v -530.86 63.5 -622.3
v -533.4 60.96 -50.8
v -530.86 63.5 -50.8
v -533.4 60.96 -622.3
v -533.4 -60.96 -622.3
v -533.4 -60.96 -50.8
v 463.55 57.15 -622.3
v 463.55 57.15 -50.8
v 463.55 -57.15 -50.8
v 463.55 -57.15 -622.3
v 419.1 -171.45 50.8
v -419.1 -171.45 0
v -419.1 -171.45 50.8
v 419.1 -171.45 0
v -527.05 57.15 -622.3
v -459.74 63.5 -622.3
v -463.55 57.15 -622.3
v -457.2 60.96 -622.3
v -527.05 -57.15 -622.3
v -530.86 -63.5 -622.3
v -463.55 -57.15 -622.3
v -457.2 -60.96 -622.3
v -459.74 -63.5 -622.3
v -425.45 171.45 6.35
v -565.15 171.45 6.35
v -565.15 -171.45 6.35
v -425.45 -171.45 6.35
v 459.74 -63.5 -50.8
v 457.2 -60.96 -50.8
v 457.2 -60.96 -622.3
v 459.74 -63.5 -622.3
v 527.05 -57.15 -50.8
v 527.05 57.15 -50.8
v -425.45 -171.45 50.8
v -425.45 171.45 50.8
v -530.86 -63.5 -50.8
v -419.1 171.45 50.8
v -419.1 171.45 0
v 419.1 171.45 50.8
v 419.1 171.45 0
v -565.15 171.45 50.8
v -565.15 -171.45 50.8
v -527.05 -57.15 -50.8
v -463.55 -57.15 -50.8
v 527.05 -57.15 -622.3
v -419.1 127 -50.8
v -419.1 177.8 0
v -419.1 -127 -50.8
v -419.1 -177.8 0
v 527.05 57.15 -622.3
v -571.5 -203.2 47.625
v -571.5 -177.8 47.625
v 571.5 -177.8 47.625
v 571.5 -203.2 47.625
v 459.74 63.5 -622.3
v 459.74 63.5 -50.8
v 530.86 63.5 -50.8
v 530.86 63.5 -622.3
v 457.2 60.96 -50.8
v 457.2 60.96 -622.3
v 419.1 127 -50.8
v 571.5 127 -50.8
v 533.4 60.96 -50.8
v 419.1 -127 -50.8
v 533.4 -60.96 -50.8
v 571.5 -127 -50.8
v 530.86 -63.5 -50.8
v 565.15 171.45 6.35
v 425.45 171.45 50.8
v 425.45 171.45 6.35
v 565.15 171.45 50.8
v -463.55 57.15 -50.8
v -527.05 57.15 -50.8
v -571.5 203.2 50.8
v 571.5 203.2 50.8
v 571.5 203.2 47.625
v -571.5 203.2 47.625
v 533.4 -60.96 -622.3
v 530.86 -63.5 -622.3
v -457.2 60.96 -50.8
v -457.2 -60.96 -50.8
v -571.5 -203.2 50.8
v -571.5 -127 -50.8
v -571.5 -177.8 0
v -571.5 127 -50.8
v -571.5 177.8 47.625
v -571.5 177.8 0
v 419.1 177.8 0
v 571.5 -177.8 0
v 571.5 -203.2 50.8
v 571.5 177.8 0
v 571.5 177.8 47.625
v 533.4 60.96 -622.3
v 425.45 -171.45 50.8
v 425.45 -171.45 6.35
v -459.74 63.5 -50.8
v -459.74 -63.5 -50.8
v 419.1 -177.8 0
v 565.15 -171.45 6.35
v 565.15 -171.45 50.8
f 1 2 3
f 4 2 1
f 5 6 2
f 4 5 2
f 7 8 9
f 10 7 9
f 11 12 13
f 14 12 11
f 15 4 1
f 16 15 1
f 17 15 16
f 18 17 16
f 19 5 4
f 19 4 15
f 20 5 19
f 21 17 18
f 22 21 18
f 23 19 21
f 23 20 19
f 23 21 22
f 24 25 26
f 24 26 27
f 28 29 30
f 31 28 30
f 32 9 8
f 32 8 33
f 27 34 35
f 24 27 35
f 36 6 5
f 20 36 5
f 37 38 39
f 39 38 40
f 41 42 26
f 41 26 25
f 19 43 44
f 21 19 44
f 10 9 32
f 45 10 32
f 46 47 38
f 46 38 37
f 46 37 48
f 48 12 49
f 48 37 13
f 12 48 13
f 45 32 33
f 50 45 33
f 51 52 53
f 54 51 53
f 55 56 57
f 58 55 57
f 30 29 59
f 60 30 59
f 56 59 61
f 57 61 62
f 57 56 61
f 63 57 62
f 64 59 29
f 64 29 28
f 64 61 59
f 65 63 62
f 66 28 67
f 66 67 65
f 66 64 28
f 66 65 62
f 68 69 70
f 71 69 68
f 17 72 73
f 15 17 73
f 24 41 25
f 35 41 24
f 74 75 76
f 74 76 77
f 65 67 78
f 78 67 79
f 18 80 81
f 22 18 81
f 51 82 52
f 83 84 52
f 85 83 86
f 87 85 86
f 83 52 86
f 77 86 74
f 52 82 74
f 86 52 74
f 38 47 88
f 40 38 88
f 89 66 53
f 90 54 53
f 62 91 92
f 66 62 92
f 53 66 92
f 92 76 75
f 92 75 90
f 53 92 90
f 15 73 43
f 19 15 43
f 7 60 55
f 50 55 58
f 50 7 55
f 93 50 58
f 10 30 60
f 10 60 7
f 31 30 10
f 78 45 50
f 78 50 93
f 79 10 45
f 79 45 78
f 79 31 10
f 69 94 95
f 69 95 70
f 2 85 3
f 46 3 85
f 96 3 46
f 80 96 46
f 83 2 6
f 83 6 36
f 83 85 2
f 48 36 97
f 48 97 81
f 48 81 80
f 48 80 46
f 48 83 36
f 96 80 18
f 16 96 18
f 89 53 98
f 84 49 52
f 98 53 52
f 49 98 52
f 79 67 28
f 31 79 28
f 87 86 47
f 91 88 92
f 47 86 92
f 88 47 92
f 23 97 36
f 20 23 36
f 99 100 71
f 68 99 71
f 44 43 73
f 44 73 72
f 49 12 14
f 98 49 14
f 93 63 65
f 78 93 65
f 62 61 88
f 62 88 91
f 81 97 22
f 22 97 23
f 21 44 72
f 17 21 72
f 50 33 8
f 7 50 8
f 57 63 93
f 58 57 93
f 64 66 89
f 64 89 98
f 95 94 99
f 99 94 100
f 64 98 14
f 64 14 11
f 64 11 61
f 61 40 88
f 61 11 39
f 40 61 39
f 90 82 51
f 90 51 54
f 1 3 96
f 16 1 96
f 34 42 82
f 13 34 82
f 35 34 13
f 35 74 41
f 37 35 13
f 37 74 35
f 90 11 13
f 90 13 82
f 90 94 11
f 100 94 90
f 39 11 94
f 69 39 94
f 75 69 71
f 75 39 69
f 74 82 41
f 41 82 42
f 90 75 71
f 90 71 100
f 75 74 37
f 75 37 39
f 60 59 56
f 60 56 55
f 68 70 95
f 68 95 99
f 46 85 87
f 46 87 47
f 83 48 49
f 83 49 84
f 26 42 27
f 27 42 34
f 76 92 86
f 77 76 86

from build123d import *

# Parameters (mm, degrees)
F0_W      = 1143
F0_H      = 355.6
F0_W_2    = 838.2
F0_H_2    = 342.9
F1_DEPTH  = 50.8
F2_W      = 139.7
F2_H      = 342.9
F3_DEPTH  = 44.45
F4_W      = 1143
F4_H      = 3.175
F5_DEPTH  = 25.4
F6_W      = 1143
F6_H      = 3.175
F7_DEPTH  = 25.4
F9_DEPTH  = 50.8
F10_SIZE  = 50.8
F13_DEPTH = 571.5
F14_SIZE  = 2.54


with BuildPart() as f1:
    # F0 (on Top) → F1 (new body)
    with BuildSketch(Plane.XY):
        Rectangle(F0_W, F0_H)
        Rectangle(F0_W_2, F0_H_2, mode=Mode.SUBTRACT)
    extrude(amount=F1_DEPTH)

    # F2 (on face) → F3 (cut)
    with BuildSketch(Plane.XY.offset(50.8)):
        with Locations((-495.3, 0)):
            Rectangle(F2_W, F2_H)
        with Locations((495.3, 0)):
            Rectangle(F2_W, F2_H)
    extrude(amount=-F3_DEPTH, mode=Mode.SUBTRACT)

    # F4 (on face) → F5 (join)
    with BuildSketch(Plane(origin=(0, 177.8, 0), x_dir=(-1, 0, 0), z_dir=(0, 1, 0))):
        with Locations((0, 49.2125)):
            Rectangle(F4_W, F4_H)
    extrude(amount=F5_DEPTH)

    # F6 (on face) → F7 (join)
    with BuildSketch(Plane.XZ.offset(177.8)):
        with Locations((0, 49.2125)):
            Rectangle(F6_W, F6_H)
    extrude(amount=F7_DEPTH)

    # F8 (on face) → F9 (join)
    with BuildSketch(Plane(origin=(0, 0, 0), x_dir=(1, 0, 0), z_dir=(0, 0, -1))):
        Polygon((-419.1, 177.8), (-571.5, 177.8), (-571.5, -177.8), (-419.1, -177.8), (-419.1, -171.45), (-419.1, 171.45), align=None)
        Polygon((571.5, 177.8), (419.1, 177.8), (419.1, 171.45), (419.1, -171.45), (419.1, -177.8), (571.5, -177.8), align=None)
    extrude(amount=F9_DEPTH)

    # F10
    f10_edges = [f1.edges().sort_by_distance(p)[0] for p in [
        (-495.3, 177.8, -50.8),
        (-495.3, -177.8, -50.8),
        (495.3, -177.8, -50.8),
        (495.3, 177.8, -50.8),
    ]]
    chamfer(f10_edges, length=F10_SIZE)

    # F11 (on face) + F12 (on face) → F13 (join)
    with BuildSketch(Plane(origin=(0, 0, -50.8), x_dir=(1, 0, 0), z_dir=(0, 0, -1))):
        Polygon((457.2, -63.5), (495.3, -63.5), (533.4, -63.5), (533.4, 63.5), (457.2, 63.5), align=None)
        Polygon((527.05, -57.15), (495.3, -57.15), (463.55, -57.15), (463.55, 57.15), (527.05, 57.15), align=None, mode=Mode.SUBTRACT)
    with BuildSketch(Plane(origin=(0, 0, -50.8), x_dir=(1, 0, 0), z_dir=(0, 0, -1))):
        Polygon((-533.4, -63.5), (-495.3, -63.5), (-457.2, -63.5), (-457.2, 63.5), (-533.4, 63.5), align=None)
        Polygon((-463.55, -57.15), (-495.3, -57.15), (-527.05, -57.15), (-527.05, 57.15), (-463.55, 57.15), align=None, mode=Mode.SUBTRACT)
    extrude(amount=F13_DEPTH)

    # F14
    f14_edges = [f1.edges().sort_by_distance(p)[0] for p in [
        (-457.2, -63.5, -336.55),
        (-533.4, -63.5, -336.55),
        (-457.2, 63.5, -336.55),
        (533.4, -63.5, -336.55),
        (457.2, -63.5, -336.55),
        (533.4, 63.5, -336.55),
        (457.2, 63.5, -336.55),
        (-533.4, 63.5, -336.55),
    ]]
    chamfer(f14_edges, length=F14_SIZE)


solid = f1.part
